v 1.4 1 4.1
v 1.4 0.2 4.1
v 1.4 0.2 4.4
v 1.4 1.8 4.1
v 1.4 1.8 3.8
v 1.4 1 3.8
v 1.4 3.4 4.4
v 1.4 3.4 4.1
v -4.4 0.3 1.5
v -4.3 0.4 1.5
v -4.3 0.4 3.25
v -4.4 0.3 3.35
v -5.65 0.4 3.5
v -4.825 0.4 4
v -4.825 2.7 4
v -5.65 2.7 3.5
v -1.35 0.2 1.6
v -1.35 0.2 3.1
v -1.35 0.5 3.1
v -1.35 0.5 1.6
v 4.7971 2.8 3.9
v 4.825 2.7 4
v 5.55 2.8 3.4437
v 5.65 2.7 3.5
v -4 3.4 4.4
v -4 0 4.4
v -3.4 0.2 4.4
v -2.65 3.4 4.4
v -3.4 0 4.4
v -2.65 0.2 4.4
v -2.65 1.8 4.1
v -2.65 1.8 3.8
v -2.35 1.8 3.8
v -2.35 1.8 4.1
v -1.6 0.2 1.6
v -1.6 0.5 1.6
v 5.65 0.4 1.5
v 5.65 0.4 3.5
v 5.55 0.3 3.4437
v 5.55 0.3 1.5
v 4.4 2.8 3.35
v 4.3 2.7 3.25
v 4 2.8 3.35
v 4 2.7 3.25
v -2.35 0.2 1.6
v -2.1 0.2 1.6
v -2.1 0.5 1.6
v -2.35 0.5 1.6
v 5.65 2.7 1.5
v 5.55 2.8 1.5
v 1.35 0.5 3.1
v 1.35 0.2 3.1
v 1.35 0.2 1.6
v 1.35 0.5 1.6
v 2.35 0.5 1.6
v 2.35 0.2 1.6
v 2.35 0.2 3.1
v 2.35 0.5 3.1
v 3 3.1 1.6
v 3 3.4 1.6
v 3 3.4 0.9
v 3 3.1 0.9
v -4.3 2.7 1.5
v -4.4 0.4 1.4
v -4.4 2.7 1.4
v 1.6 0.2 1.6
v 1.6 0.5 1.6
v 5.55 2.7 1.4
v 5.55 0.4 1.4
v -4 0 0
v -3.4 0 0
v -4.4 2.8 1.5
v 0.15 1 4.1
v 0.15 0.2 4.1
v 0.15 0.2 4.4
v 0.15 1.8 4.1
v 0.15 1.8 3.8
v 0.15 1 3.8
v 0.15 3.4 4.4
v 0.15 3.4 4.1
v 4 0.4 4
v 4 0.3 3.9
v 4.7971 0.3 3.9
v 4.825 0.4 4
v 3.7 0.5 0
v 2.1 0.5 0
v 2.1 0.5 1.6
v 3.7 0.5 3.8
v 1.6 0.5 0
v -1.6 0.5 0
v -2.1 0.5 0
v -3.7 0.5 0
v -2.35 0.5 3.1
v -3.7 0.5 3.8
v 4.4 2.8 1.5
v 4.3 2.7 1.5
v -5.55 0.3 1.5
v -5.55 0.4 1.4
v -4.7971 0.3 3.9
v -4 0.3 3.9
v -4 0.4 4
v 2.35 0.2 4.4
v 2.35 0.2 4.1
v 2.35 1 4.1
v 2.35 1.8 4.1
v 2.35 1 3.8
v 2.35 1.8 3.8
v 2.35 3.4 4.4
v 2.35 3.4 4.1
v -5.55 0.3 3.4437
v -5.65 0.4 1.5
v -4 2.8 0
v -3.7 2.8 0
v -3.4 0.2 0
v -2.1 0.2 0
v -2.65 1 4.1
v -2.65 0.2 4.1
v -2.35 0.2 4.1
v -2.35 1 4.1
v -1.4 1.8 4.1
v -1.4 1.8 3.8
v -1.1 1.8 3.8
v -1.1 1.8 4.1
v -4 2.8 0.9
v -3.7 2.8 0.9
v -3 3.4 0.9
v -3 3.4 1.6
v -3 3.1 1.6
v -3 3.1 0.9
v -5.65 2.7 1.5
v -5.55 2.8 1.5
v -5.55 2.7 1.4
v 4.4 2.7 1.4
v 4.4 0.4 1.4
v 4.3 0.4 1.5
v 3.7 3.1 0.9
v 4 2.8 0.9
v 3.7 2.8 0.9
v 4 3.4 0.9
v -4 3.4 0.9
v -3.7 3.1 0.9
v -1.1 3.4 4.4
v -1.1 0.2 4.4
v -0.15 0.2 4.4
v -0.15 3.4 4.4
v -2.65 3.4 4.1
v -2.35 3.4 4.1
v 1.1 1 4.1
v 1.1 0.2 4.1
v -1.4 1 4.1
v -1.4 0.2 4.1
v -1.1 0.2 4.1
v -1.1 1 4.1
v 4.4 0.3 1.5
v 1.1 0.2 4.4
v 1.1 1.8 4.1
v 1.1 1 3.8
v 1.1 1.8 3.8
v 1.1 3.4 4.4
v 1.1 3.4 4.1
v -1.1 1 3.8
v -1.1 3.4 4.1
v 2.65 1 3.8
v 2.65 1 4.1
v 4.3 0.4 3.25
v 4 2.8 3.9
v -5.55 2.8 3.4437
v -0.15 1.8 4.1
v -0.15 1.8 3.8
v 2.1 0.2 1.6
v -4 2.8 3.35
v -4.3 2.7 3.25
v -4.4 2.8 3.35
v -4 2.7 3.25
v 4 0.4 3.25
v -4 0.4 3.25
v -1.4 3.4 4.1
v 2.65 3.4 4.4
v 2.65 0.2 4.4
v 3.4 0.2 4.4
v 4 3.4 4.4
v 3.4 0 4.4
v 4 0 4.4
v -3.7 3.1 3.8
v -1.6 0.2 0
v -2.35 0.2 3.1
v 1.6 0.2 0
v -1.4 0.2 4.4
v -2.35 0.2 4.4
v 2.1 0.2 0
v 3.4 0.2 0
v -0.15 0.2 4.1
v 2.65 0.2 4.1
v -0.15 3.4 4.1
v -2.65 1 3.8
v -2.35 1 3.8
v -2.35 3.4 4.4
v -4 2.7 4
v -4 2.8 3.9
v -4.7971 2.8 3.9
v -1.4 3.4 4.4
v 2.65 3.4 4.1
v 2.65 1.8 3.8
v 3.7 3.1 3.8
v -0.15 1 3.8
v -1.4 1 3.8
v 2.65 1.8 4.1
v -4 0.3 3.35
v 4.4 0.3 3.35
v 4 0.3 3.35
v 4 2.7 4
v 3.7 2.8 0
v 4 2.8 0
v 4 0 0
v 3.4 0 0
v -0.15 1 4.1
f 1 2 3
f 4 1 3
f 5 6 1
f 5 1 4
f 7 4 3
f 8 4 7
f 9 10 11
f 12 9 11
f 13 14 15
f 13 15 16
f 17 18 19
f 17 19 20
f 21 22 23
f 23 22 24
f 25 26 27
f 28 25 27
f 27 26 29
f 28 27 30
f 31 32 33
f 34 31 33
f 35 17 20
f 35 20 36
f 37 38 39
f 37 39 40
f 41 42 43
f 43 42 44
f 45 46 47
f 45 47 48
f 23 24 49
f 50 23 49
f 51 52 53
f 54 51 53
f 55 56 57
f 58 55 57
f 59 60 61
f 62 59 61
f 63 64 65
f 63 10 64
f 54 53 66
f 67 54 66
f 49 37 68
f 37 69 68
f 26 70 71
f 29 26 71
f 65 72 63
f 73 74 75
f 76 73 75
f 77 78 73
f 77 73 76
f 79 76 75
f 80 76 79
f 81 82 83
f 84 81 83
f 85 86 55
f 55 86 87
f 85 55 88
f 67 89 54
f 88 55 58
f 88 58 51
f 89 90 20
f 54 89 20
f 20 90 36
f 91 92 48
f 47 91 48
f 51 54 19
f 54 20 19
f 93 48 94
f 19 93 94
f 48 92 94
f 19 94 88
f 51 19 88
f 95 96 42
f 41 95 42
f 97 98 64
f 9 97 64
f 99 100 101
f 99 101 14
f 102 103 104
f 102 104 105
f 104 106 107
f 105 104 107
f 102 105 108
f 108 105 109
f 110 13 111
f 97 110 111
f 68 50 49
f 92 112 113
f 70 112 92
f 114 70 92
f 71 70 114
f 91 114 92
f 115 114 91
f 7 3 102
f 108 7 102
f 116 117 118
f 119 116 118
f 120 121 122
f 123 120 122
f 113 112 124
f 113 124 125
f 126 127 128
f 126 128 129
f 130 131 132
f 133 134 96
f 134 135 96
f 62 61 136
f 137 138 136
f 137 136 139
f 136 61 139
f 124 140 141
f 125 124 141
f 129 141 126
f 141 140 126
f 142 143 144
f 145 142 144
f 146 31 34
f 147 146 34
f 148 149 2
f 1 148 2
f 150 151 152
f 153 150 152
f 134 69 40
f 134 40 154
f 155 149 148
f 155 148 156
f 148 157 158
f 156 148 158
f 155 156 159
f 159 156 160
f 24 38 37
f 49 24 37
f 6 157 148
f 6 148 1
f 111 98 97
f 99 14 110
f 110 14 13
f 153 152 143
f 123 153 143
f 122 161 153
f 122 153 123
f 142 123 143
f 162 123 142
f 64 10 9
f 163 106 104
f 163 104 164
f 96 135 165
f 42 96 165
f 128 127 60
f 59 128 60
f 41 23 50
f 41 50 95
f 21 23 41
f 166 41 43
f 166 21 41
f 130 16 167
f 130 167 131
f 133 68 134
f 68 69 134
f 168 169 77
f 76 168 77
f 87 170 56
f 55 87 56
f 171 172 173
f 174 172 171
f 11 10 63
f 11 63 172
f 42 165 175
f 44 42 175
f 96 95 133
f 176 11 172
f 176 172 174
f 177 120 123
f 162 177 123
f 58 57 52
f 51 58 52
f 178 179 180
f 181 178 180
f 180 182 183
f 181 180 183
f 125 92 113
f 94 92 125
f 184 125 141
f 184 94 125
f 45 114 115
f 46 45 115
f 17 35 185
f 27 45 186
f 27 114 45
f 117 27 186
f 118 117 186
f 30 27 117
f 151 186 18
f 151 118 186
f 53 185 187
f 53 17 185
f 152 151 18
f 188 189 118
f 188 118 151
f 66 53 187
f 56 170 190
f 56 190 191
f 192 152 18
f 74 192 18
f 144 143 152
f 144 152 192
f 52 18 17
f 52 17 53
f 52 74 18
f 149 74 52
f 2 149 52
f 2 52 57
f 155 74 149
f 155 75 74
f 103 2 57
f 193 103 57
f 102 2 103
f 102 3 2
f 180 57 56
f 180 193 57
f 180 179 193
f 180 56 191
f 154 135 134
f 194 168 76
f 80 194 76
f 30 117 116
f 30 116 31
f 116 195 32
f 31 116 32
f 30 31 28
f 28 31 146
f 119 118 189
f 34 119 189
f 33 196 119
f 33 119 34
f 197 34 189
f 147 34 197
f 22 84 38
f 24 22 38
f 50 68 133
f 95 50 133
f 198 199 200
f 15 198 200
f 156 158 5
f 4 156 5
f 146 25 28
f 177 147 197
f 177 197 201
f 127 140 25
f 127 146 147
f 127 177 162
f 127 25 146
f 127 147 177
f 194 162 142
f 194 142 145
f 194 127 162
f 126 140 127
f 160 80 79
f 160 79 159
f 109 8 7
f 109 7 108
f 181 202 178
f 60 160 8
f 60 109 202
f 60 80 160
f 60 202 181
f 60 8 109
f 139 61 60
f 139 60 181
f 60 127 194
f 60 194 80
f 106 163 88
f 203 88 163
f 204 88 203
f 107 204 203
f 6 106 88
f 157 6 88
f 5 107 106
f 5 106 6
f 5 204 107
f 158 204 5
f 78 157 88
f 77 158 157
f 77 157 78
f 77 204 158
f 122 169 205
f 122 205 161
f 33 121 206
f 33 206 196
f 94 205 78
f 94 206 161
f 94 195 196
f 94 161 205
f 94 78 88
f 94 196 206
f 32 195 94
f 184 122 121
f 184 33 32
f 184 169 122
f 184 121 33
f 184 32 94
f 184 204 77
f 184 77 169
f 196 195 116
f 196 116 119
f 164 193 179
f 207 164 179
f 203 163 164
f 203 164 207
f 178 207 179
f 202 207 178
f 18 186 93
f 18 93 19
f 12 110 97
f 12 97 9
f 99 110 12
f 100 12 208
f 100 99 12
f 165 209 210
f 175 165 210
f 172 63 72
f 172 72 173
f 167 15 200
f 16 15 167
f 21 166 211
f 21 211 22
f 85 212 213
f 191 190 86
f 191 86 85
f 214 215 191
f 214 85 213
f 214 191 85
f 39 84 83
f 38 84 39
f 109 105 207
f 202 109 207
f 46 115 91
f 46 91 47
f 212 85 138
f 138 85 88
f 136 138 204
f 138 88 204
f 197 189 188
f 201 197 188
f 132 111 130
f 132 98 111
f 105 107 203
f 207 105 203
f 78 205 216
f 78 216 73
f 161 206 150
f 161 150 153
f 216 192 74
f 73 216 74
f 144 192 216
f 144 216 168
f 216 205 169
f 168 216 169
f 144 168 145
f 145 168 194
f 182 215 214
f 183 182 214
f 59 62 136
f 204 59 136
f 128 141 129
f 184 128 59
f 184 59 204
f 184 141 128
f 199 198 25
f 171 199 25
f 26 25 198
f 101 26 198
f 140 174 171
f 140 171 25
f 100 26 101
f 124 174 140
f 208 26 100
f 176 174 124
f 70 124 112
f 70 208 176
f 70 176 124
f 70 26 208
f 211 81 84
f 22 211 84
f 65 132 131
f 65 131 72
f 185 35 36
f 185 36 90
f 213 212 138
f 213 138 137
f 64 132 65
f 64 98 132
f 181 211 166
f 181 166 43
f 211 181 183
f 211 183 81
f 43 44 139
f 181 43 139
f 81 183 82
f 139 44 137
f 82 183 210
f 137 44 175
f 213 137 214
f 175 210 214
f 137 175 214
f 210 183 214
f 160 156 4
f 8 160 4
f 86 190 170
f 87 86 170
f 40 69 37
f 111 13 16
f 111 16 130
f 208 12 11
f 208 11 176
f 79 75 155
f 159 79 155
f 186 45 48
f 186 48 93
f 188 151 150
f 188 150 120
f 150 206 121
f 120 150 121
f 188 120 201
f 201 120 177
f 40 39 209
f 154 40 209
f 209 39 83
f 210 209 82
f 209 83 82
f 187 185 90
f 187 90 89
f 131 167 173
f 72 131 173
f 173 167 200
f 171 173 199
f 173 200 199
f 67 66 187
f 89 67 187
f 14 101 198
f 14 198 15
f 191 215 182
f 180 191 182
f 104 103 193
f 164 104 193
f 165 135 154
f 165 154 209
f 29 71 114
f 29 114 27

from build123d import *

# Parameters (mm, degrees)
SKETCH1_W                = 8
SKETCH1_H                = 4.4
BOSS_EXTRUDE1_DEPTH      = 3.4
SKETCH4_W                = 6.8
SKETCH4_H                = 4.4
CUT_EXTRUDE1_DEPTH       = 0.2
SHELL1_START             = -3.7
SHELL1_OUTLINE_W         = 2.6
SHELL1_OUTLINE_H         = 4.1
SHELL1_DEPTH             = 7.4
CUT_EXTRUDE3_REACH       = 8.85
SKETCH8_W                = 7.4
SKETCH8_H                = 2.6
BOSS_EXTRUDE2_DEPTH      = 0.3
SKETCH3_3_W              = 0.3
SKETCH3_3_H              = 1.4
CUT_EXTRUDE4_DEPTH       = 7.849817516
SKETCH9_W                = 0.3
SKETCH9_H                = 0.8
CUT_EXTRUDE5_DEPTH       = 7.849817516
SKETCH10_W               = 8
SKETCH10_H               = 0.9
CUT_EXTRUDE6_DEPTH       = 0.6
SKETCH11_W               = 6
SKETCH11_H               = 0.7
CUT_EXTRUDE7_DEPTH       = 1
BOSS_EXTRUDE3_START      = -0.3
BOSS_EXTRUDE3_DEPTH      = 2.5
CHAMFER1_SIZE            = 0.1
CHAMFER1_OF_MIRROR2_SIZE = 0.1


# Read off the part's stored shape, not the designer's step: Shell1
with BuildPart() as part:
    # Sketch1 → Boss-Extrude1 (new body)
    with BuildSketch(Plane(origin=(0, 0, 0), x_dir=(1, 0, 0), z_dir=(0, 1, 0))):
        with Locations((0, -2.2)):
            Rectangle(SKETCH1_W, SKETCH1_H)
    extrude(amount=BOSS_EXTRUDE1_DEPTH)

    # Sketch4 → Cut-Extrude1 (cut)
    with BuildSketch(Plane.XZ):
        with Locations((0, 2.2)):
            Rectangle(SKETCH4_W, SKETCH4_H)
    extrude(amount=-CUT_EXTRUDE1_DEPTH, mode=Mode.SUBTRACT)

    # Shell1 outline → Shell1 (cut)
    with BuildSketch(Plane.YZ.offset(SHELL1_START)):
        with Locations((1.8, 2.05)):
            Rectangle(SHELL1_OUTLINE_W, SHELL1_OUTLINE_H)
    extrude(amount=SHELL1_DEPTH, mode=Mode.SUBTRACT)

    # Sketch3 → Cut-Extrude3 (cut, up to next)
    with BuildSketch(Plane(origin=(0, 0, 0), x_dir=(1, 0, 0), z_dir=(0, 1, 0)), mode=Mode.PRIVATE) as cut_extrude3_sk1:
        Polygon((-1.6, -1.6), (-1.6, 0), (-2.1, 0), (-2.1, -1.6), (-2.35, -1.6), (-2.35, -3.1), (-1.35, -3.1), (-1.35, -1.6), align=None)
    cut_extrude3_tool1 = extrude(cut_extrude3_sk1.sketch, amount=CUT_EXTRUDE3_REACH, mode=Mode.PRIVATE) & part.part
    cut_extrude3 = cut_extrude3_tool1.solids().sort_by_distance((-1.85, 0, 1.81087))[0]
    add(cut_extrude3, mode=Mode.SUBTRACT)

    # Mirror1: Cut-Extrude3 across plane
    add(cut_extrude3.mirror(Plane(origin=(0, 0, 0), x_dir=(0, 0, 1), z_dir=(1, 0, 0))), mode=Mode.SUBTRACT)

    # Sketch8 → Boss-Extrude2 (add)
    with BuildSketch(Plane(origin=(0, 0, 4.1), x_dir=(-1, 0, 0), z_dir=(0, 0, -1))):
        with Locations((0, 1.8)):
            Rectangle(SKETCH8_W, SKETCH8_H)
    extrude(amount=BOSS_EXTRUDE2_DEPTH)

    # Sketch3<3> → Cut-Extrude4 (cut, through all)
    with BuildSketch(Plane(origin=(0, 0, 0), x_dir=(1, 0, 0), z_dir=(0, 1, 0))):
        with Locations((-2.5, -4.8)):
            Rectangle(SKETCH3_3_W, SKETCH3_3_H)
        with Locations((-1.25, -4.8)):
            Rectangle(SKETCH3_3_W, SKETCH3_3_H)
        with Locations((0, -4.8)):
            Rectangle(SKETCH3_3_W, SKETCH3_3_H)
        with Locations((1.25, -4.8)):
            Rectangle(SKETCH3_3_W, SKETCH3_3_H)
        with Locations((2.5, -4.8)):
            Rectangle(SKETCH3_3_W, SKETCH3_3_H)
    extrude(amount=CUT_EXTRUDE4_DEPTH, mode=Mode.SUBTRACT)

    # Sketch9 → Cut-Extrude5 (cut, through all)
    with BuildSketch(Plane.XY):
        with Locations((-2.5, 1.4)):
            Rectangle(SKETCH9_W, SKETCH9_H)
        with Locations((-1.25, 1.4)):
            Rectangle(SKETCH9_W, SKETCH9_H)
        with Locations((0, 1.4)):
            Rectangle(SKETCH9_W, SKETCH9_H)
        with Locations((1.25, 1.4)):
            Rectangle(SKETCH9_W, SKETCH9_H)
        with Locations((2.5, 1.4)):
            Rectangle(SKETCH9_W, SKETCH9_H)
    extrude(amount=CUT_EXTRUDE5_DEPTH, mode=Mode.SUBTRACT)

    # Sketch10 → Cut-Extrude6 (cut)
    with BuildSketch(Plane(origin=(0, 3.4, 0), x_dir=(1, 0, 0), z_dir=(0, 1, 0))):
        with Locations((0, -0.45)):
            Rectangle(SKETCH10_W, SKETCH10_H)
    extrude(amount=-CUT_EXTRUDE6_DEPTH, mode=Mode.SUBTRACT)

    # Sketch11 → Cut-Extrude7 (cut)
    with BuildSketch(Plane(origin=(0, 3.4, 0), x_dir=(1, 0, 0), z_dir=(0, 1, 0))):
        with Locations((0, -1.25)):
            Rectangle(SKETCH11_W, SKETCH11_H)
    extrude(amount=-CUT_EXTRUDE7_DEPTH, mode=Mode.SUBTRACT)

    # Sketch12 → Boss-Extrude3 (add)
    with BuildSketch(Plane.XZ.offset(BOSS_EXTRUDE3_START)):
        Polygon((4, 4), (4.825, 4), (5.65, 3.5), (5.65, 1.4), (4.3, 1.4), (4.3, 3.25), (4, 3.25), align=None)
    boss_extrude3 = extrude(amount=-BOSS_EXTRUDE3_DEPTH)

    # Chamfer1
    chamfer1_edges = [part.edges().sort_by_distance(p)[0] for p in [
        (4.4125, 2.8, 4),
        (5.2375, 2.8, 3.75),
        (5.65, 2.8, 2.45),
        (4.975, 2.8, 1.4),
        (5.65, 1.55, 1.4),
        (4.3, 2.8, 2.325),
        (4.3, 1.55, 1.4),
        (4.15, 2.8, 3.25),
        (4.15, 0.3, 3.25),
        (4.3, 0.3, 2.325),
        (4.975, 0.3, 1.4),
        (5.65, 0.3, 2.45),
        (5.2375, 0.3, 3.75),
        (4.4125, 0.3, 4),
    ]]
    chamfer(chamfer1_edges, length=CHAMFER1_SIZE)

    # Mirror2: Boss-Extrude3 across plane
    add(boss_extrude3.mirror(Plane(origin=(0, 0, 0), x_dir=(0, 0, 1), z_dir=(1, 0, 0))))

    # Chamfer1 of Mirror2
    chamfer1_of_mirror2_edges = [part.edges().sort_by_distance(p)[0] for p in [
        (-4.4125, 2.8, 4),
        (-5.2375, 2.8, 3.75),
        (-5.65, 2.8, 2.45),
        (-4.975, 2.8, 1.4),
        (-5.65, 1.55, 1.4),
        (-4.3, 2.8, 2.325),
        (-4.3, 1.55, 1.4),
        (-4.15, 2.8, 3.25),
        (-4.15, 0.3, 3.25),
        (-4.3, 0.3, 2.325),
        (-4.975, 0.3, 1.4),
        (-5.65, 0.3, 2.45),
        (-5.2375, 0.3, 3.75),
        (-4.4125, 0.3, 4),
    ]]
    chamfer(chamfer1_of_mirror2_edges, length=CHAMFER1_OF_MIRROR2_SIZE)


solid = part.part
